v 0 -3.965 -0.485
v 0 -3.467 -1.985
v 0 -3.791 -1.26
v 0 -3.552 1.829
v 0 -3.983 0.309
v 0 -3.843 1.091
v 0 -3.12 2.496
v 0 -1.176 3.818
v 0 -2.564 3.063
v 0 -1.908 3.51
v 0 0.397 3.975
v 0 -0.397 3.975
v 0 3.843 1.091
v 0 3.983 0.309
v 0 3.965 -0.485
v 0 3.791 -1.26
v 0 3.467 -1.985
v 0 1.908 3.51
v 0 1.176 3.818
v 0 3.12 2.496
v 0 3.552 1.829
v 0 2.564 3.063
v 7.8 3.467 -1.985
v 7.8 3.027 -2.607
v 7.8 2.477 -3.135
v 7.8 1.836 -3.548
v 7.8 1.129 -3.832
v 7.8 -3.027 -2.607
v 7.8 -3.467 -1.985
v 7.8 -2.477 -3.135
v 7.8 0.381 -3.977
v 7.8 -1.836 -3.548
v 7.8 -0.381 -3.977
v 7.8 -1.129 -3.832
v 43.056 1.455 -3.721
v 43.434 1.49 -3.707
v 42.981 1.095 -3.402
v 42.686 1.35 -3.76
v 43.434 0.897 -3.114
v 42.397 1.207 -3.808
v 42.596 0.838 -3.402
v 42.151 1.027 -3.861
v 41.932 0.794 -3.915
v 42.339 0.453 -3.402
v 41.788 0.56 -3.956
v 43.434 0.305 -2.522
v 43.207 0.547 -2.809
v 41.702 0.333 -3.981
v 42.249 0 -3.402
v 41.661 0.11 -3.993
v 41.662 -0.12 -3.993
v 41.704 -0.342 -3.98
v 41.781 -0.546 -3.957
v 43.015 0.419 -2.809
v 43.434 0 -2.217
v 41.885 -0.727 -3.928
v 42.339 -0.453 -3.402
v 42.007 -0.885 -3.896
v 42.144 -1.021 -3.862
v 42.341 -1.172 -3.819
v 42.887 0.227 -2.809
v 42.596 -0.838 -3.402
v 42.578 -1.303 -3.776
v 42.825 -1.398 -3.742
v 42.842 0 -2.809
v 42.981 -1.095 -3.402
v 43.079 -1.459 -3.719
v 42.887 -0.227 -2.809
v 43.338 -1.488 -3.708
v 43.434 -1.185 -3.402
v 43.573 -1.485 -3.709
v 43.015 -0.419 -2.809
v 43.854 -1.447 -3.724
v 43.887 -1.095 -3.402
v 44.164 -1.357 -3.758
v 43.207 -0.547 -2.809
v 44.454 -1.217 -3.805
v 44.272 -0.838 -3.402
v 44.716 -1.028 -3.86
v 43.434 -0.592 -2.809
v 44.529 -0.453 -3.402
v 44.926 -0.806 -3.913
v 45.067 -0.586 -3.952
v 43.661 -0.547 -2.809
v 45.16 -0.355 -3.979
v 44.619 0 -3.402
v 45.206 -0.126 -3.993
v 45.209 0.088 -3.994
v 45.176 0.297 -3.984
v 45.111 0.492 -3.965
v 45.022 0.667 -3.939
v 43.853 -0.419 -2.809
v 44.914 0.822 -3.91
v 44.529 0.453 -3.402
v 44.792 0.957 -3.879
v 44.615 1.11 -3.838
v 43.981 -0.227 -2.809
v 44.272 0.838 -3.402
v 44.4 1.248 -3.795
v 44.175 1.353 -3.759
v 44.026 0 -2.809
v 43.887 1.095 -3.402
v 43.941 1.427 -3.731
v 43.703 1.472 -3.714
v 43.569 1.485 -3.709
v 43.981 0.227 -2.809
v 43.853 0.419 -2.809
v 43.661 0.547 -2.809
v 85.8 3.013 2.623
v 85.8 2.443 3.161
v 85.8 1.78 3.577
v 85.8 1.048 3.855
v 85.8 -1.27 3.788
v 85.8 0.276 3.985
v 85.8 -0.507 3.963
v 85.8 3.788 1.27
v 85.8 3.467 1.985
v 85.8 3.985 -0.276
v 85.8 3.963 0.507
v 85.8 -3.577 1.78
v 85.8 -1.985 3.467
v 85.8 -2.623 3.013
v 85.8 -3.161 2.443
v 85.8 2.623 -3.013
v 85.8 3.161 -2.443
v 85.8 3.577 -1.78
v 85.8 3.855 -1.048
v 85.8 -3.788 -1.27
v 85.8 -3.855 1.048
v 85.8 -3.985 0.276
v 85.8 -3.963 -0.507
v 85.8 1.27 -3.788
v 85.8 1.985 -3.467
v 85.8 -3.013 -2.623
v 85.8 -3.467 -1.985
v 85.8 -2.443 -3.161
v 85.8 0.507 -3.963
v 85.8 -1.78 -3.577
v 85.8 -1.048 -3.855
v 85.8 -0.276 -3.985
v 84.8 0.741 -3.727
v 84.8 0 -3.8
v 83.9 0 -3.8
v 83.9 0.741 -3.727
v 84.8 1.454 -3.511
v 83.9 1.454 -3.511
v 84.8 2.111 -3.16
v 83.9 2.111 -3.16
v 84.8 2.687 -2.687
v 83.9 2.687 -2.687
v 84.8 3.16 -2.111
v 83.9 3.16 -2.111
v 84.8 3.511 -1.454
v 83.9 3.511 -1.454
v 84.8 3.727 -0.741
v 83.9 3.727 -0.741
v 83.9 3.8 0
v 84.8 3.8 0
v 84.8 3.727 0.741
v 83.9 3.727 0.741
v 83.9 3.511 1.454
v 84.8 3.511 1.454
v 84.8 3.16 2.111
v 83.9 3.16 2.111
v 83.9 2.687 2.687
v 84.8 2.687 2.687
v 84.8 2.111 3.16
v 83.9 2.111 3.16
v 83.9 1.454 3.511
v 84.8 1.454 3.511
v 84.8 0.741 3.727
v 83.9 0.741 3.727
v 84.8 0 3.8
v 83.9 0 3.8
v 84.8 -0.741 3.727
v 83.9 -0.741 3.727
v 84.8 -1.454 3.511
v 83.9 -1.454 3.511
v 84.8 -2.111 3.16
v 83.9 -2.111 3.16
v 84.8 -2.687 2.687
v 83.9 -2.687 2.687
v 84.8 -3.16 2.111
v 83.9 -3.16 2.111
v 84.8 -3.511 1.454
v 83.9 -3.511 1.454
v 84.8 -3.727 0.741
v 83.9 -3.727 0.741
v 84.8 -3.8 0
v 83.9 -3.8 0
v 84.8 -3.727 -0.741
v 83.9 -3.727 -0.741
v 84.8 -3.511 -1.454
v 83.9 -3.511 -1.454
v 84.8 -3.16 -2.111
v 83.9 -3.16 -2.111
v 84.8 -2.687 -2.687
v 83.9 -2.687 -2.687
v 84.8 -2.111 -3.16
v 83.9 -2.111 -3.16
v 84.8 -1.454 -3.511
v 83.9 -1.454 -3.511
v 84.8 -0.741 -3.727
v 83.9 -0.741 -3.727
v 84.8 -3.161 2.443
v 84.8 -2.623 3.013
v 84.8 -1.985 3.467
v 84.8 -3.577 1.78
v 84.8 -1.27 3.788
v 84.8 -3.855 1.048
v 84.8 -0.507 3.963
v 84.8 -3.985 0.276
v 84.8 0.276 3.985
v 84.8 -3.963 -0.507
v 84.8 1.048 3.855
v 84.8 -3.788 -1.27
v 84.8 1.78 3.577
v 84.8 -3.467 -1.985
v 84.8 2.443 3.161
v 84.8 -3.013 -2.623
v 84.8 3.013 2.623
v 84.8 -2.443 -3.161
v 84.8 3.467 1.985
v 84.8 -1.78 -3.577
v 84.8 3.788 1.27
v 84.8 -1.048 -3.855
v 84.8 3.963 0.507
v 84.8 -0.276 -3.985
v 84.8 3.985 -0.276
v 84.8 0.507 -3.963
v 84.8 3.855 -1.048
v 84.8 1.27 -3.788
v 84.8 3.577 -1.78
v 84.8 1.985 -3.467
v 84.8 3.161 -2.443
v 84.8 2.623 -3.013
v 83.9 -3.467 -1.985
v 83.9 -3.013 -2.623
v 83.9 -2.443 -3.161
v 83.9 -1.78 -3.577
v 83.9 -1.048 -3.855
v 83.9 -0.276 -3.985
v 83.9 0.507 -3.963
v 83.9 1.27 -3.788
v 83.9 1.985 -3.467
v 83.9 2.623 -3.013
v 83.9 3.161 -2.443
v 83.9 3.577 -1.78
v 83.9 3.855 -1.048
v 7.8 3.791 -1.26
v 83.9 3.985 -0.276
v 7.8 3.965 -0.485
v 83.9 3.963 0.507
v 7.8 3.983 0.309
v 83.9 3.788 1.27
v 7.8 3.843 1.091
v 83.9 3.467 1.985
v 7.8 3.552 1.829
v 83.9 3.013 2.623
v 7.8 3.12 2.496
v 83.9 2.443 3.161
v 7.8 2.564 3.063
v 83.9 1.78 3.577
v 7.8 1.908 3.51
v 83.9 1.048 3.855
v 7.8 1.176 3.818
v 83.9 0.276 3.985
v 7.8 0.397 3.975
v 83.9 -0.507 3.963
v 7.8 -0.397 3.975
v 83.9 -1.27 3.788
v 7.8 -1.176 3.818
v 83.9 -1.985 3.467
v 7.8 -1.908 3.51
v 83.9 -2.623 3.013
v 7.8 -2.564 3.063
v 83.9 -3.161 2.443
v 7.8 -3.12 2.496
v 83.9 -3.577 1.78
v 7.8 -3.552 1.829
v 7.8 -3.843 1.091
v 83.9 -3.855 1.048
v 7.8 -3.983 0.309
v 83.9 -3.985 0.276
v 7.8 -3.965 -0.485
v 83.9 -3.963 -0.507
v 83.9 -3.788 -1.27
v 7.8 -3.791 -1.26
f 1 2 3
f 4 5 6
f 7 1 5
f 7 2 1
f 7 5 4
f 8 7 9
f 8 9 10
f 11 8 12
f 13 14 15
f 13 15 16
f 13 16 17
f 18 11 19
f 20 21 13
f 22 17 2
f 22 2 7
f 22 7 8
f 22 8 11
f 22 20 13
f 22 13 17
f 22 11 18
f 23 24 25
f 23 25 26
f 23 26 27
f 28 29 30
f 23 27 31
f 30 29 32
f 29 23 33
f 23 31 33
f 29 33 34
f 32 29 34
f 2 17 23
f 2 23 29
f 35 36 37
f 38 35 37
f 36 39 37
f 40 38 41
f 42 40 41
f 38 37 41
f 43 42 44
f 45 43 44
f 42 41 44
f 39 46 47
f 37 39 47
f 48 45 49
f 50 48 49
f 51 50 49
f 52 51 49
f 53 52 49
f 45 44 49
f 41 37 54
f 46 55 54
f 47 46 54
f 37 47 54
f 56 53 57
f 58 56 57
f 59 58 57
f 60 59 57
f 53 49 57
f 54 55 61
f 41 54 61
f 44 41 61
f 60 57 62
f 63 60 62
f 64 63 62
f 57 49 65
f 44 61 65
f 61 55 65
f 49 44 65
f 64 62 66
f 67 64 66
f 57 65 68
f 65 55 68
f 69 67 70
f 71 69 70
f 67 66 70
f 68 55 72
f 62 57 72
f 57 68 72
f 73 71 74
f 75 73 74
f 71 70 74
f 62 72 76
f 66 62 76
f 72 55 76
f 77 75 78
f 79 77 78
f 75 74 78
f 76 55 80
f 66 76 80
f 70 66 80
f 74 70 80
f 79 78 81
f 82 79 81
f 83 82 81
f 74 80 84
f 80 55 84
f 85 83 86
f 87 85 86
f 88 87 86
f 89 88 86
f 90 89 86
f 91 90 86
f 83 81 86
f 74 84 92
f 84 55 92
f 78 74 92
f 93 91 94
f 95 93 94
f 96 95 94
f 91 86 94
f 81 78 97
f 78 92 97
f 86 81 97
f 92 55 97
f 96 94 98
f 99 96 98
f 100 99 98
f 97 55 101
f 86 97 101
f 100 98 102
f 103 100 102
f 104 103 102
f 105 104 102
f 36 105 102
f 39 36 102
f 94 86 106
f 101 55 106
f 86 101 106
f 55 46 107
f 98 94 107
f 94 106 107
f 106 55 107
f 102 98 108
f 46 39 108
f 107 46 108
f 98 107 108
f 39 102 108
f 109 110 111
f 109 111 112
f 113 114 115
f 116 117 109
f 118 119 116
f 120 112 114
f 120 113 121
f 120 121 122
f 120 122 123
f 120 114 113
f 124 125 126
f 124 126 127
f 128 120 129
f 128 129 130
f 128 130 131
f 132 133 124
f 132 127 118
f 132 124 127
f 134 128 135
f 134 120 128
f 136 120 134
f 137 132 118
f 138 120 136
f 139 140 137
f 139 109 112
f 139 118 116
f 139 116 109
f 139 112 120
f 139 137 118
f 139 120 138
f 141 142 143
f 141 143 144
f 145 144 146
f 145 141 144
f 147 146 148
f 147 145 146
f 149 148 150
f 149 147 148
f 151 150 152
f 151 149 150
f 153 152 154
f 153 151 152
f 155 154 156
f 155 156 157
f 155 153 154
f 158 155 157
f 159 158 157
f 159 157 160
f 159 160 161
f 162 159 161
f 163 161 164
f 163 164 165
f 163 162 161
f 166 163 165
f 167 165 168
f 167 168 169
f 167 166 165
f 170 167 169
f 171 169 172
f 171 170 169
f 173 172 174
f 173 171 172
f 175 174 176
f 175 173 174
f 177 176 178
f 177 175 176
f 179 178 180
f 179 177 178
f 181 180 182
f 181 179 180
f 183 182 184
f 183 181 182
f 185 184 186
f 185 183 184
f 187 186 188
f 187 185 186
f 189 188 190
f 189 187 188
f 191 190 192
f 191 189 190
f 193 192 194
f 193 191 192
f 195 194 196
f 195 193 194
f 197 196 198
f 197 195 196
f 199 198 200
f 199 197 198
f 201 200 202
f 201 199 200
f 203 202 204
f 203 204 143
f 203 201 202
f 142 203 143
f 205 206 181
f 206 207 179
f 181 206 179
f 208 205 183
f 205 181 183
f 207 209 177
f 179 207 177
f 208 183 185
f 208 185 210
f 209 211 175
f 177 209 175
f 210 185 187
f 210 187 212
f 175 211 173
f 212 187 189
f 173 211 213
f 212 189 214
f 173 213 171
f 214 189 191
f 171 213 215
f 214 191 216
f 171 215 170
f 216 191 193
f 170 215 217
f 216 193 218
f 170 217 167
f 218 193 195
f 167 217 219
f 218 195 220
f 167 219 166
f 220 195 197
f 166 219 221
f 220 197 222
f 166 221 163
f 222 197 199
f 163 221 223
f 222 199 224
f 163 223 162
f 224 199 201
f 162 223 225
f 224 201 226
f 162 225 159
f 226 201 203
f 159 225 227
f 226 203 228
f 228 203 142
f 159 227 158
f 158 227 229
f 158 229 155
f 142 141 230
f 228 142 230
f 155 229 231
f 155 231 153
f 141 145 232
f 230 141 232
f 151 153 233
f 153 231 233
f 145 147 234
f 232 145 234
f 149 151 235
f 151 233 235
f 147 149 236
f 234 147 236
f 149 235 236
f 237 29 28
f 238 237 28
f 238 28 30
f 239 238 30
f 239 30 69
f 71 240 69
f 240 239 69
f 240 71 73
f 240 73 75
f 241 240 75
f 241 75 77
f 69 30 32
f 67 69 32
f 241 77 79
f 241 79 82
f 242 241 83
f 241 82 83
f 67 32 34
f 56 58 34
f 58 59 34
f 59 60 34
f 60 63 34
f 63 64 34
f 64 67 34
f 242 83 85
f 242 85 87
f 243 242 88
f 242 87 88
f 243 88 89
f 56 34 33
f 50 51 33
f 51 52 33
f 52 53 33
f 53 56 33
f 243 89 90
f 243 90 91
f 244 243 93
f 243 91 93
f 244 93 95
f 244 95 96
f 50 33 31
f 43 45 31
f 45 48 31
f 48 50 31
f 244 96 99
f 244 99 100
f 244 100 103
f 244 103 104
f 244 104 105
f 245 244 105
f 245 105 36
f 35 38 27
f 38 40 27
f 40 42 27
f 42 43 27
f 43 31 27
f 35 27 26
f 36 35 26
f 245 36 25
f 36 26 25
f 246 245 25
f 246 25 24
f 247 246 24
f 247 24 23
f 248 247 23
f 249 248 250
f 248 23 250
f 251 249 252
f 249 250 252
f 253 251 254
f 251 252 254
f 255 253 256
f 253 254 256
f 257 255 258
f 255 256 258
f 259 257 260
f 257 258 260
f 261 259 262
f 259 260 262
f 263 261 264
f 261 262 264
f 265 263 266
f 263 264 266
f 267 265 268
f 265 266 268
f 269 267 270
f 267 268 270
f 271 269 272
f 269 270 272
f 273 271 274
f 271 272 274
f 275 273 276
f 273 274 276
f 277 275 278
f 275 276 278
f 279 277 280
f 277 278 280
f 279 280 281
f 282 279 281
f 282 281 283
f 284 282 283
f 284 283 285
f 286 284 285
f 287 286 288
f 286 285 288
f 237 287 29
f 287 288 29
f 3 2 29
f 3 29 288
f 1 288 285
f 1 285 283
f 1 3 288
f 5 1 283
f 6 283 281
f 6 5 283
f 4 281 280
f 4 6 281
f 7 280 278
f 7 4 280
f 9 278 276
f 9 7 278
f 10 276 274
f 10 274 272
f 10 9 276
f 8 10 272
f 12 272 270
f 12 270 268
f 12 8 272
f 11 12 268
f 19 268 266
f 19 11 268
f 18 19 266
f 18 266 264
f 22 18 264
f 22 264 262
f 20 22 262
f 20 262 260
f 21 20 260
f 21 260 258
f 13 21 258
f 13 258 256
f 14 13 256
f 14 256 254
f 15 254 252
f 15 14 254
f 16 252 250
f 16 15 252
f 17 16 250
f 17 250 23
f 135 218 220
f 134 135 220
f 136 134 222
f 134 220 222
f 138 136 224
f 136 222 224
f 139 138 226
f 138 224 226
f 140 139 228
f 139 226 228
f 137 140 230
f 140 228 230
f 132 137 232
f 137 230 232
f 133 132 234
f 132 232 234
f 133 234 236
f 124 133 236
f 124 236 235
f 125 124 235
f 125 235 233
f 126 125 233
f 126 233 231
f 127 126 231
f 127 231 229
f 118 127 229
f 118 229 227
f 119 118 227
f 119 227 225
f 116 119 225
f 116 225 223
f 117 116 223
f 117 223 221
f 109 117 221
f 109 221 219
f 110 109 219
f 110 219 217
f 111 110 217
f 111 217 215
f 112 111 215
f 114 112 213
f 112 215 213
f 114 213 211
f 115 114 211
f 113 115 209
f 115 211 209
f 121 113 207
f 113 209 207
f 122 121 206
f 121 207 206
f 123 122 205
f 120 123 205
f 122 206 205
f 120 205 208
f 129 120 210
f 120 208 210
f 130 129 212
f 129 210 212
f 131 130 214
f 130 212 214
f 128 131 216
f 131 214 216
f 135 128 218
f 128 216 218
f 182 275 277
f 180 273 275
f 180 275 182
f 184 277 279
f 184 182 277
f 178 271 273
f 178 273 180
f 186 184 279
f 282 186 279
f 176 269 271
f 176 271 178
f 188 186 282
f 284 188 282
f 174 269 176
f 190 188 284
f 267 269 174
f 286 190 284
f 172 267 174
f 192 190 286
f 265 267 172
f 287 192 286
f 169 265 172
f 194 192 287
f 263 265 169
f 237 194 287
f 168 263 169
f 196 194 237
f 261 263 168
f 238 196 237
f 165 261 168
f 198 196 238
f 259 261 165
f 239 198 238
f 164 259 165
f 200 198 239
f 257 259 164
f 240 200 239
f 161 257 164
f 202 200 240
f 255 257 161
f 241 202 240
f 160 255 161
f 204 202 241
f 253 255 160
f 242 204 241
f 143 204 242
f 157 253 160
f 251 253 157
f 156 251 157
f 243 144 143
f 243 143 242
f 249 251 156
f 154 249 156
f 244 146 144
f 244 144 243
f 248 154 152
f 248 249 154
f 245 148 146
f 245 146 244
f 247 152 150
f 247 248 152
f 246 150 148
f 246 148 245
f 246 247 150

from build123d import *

# Parameters (mm, degrees)
BOSS_EXTRUDE1_DEPTH = 7.8
SKETCH2_R           = 3.995
BOSS_EXTRUDE2_DEPTH = 78
CUT_EXTRUDE1_START  = -1
SKETCH3_R           = 5
SKETCH3_R_2         = 3.8
CUT_EXTRUDE1_DEPTH  = 0.9


with BuildPart() as part:
    # Sketch1 → Boss-Extrude1 (new body)
    with BuildSketch(Plane(origin=(0, 0, 0), x_dir=(0, 0, -1), z_dir=(1, 0, 0))):
        with BuildLine():
            Line((1.985, 3.466958321), (1.985, -3.466958321))
            ThreePointArc((1.985, -3.466958321), (-3.995, 0), (1.985, 3.466958321))
        make_face()
    extrude(amount=BOSS_EXTRUDE1_DEPTH)

    # Sketch2 → Boss-Extrude2 (add)
    with BuildSketch(Plane(origin=(7.8, 0, 0), x_dir=(0, 0, -1), z_dir=(1, 0, 0))):
        with Locations(Location((0, 0, 0), (0, 0, 299.79320791))):
            Circle(SKETCH2_R)
    extrude(amount=BOSS_EXTRUDE2_DEPTH)

    # Sketch3 → Cut-Extrude1 (cut)
    with BuildSketch(Plane(origin=(85.8, 0, 0), x_dir=(0, 0, -1), z_dir=(1, 0, 0)).offset(CUT_EXTRUDE1_START)):
        Circle(SKETCH3_R)
        Circle(SKETCH3_R_2, mode=Mode.SUBTRACT)
    extrude(amount=-CUT_EXTRUDE1_DEPTH, mode=Mode.SUBTRACT)

    # Cut-Extrude2 cone 1 section (through the dimple's axis) → Cut-Extrude2 (revolve, cut)
    with BuildSketch(Plane(origin=(43.434, 0, -3.995), x_dir=(0, 1, 0), z_dir=(1, 0, 0))):
        Polygon((0, 0), (1.778, 0), (0, 1.778), align=None)
    revolve(axis=Axis((43.434, 0, -3.995), (0, 0, 1)), mode=Mode.SUBTRACT)


solid = part.part
